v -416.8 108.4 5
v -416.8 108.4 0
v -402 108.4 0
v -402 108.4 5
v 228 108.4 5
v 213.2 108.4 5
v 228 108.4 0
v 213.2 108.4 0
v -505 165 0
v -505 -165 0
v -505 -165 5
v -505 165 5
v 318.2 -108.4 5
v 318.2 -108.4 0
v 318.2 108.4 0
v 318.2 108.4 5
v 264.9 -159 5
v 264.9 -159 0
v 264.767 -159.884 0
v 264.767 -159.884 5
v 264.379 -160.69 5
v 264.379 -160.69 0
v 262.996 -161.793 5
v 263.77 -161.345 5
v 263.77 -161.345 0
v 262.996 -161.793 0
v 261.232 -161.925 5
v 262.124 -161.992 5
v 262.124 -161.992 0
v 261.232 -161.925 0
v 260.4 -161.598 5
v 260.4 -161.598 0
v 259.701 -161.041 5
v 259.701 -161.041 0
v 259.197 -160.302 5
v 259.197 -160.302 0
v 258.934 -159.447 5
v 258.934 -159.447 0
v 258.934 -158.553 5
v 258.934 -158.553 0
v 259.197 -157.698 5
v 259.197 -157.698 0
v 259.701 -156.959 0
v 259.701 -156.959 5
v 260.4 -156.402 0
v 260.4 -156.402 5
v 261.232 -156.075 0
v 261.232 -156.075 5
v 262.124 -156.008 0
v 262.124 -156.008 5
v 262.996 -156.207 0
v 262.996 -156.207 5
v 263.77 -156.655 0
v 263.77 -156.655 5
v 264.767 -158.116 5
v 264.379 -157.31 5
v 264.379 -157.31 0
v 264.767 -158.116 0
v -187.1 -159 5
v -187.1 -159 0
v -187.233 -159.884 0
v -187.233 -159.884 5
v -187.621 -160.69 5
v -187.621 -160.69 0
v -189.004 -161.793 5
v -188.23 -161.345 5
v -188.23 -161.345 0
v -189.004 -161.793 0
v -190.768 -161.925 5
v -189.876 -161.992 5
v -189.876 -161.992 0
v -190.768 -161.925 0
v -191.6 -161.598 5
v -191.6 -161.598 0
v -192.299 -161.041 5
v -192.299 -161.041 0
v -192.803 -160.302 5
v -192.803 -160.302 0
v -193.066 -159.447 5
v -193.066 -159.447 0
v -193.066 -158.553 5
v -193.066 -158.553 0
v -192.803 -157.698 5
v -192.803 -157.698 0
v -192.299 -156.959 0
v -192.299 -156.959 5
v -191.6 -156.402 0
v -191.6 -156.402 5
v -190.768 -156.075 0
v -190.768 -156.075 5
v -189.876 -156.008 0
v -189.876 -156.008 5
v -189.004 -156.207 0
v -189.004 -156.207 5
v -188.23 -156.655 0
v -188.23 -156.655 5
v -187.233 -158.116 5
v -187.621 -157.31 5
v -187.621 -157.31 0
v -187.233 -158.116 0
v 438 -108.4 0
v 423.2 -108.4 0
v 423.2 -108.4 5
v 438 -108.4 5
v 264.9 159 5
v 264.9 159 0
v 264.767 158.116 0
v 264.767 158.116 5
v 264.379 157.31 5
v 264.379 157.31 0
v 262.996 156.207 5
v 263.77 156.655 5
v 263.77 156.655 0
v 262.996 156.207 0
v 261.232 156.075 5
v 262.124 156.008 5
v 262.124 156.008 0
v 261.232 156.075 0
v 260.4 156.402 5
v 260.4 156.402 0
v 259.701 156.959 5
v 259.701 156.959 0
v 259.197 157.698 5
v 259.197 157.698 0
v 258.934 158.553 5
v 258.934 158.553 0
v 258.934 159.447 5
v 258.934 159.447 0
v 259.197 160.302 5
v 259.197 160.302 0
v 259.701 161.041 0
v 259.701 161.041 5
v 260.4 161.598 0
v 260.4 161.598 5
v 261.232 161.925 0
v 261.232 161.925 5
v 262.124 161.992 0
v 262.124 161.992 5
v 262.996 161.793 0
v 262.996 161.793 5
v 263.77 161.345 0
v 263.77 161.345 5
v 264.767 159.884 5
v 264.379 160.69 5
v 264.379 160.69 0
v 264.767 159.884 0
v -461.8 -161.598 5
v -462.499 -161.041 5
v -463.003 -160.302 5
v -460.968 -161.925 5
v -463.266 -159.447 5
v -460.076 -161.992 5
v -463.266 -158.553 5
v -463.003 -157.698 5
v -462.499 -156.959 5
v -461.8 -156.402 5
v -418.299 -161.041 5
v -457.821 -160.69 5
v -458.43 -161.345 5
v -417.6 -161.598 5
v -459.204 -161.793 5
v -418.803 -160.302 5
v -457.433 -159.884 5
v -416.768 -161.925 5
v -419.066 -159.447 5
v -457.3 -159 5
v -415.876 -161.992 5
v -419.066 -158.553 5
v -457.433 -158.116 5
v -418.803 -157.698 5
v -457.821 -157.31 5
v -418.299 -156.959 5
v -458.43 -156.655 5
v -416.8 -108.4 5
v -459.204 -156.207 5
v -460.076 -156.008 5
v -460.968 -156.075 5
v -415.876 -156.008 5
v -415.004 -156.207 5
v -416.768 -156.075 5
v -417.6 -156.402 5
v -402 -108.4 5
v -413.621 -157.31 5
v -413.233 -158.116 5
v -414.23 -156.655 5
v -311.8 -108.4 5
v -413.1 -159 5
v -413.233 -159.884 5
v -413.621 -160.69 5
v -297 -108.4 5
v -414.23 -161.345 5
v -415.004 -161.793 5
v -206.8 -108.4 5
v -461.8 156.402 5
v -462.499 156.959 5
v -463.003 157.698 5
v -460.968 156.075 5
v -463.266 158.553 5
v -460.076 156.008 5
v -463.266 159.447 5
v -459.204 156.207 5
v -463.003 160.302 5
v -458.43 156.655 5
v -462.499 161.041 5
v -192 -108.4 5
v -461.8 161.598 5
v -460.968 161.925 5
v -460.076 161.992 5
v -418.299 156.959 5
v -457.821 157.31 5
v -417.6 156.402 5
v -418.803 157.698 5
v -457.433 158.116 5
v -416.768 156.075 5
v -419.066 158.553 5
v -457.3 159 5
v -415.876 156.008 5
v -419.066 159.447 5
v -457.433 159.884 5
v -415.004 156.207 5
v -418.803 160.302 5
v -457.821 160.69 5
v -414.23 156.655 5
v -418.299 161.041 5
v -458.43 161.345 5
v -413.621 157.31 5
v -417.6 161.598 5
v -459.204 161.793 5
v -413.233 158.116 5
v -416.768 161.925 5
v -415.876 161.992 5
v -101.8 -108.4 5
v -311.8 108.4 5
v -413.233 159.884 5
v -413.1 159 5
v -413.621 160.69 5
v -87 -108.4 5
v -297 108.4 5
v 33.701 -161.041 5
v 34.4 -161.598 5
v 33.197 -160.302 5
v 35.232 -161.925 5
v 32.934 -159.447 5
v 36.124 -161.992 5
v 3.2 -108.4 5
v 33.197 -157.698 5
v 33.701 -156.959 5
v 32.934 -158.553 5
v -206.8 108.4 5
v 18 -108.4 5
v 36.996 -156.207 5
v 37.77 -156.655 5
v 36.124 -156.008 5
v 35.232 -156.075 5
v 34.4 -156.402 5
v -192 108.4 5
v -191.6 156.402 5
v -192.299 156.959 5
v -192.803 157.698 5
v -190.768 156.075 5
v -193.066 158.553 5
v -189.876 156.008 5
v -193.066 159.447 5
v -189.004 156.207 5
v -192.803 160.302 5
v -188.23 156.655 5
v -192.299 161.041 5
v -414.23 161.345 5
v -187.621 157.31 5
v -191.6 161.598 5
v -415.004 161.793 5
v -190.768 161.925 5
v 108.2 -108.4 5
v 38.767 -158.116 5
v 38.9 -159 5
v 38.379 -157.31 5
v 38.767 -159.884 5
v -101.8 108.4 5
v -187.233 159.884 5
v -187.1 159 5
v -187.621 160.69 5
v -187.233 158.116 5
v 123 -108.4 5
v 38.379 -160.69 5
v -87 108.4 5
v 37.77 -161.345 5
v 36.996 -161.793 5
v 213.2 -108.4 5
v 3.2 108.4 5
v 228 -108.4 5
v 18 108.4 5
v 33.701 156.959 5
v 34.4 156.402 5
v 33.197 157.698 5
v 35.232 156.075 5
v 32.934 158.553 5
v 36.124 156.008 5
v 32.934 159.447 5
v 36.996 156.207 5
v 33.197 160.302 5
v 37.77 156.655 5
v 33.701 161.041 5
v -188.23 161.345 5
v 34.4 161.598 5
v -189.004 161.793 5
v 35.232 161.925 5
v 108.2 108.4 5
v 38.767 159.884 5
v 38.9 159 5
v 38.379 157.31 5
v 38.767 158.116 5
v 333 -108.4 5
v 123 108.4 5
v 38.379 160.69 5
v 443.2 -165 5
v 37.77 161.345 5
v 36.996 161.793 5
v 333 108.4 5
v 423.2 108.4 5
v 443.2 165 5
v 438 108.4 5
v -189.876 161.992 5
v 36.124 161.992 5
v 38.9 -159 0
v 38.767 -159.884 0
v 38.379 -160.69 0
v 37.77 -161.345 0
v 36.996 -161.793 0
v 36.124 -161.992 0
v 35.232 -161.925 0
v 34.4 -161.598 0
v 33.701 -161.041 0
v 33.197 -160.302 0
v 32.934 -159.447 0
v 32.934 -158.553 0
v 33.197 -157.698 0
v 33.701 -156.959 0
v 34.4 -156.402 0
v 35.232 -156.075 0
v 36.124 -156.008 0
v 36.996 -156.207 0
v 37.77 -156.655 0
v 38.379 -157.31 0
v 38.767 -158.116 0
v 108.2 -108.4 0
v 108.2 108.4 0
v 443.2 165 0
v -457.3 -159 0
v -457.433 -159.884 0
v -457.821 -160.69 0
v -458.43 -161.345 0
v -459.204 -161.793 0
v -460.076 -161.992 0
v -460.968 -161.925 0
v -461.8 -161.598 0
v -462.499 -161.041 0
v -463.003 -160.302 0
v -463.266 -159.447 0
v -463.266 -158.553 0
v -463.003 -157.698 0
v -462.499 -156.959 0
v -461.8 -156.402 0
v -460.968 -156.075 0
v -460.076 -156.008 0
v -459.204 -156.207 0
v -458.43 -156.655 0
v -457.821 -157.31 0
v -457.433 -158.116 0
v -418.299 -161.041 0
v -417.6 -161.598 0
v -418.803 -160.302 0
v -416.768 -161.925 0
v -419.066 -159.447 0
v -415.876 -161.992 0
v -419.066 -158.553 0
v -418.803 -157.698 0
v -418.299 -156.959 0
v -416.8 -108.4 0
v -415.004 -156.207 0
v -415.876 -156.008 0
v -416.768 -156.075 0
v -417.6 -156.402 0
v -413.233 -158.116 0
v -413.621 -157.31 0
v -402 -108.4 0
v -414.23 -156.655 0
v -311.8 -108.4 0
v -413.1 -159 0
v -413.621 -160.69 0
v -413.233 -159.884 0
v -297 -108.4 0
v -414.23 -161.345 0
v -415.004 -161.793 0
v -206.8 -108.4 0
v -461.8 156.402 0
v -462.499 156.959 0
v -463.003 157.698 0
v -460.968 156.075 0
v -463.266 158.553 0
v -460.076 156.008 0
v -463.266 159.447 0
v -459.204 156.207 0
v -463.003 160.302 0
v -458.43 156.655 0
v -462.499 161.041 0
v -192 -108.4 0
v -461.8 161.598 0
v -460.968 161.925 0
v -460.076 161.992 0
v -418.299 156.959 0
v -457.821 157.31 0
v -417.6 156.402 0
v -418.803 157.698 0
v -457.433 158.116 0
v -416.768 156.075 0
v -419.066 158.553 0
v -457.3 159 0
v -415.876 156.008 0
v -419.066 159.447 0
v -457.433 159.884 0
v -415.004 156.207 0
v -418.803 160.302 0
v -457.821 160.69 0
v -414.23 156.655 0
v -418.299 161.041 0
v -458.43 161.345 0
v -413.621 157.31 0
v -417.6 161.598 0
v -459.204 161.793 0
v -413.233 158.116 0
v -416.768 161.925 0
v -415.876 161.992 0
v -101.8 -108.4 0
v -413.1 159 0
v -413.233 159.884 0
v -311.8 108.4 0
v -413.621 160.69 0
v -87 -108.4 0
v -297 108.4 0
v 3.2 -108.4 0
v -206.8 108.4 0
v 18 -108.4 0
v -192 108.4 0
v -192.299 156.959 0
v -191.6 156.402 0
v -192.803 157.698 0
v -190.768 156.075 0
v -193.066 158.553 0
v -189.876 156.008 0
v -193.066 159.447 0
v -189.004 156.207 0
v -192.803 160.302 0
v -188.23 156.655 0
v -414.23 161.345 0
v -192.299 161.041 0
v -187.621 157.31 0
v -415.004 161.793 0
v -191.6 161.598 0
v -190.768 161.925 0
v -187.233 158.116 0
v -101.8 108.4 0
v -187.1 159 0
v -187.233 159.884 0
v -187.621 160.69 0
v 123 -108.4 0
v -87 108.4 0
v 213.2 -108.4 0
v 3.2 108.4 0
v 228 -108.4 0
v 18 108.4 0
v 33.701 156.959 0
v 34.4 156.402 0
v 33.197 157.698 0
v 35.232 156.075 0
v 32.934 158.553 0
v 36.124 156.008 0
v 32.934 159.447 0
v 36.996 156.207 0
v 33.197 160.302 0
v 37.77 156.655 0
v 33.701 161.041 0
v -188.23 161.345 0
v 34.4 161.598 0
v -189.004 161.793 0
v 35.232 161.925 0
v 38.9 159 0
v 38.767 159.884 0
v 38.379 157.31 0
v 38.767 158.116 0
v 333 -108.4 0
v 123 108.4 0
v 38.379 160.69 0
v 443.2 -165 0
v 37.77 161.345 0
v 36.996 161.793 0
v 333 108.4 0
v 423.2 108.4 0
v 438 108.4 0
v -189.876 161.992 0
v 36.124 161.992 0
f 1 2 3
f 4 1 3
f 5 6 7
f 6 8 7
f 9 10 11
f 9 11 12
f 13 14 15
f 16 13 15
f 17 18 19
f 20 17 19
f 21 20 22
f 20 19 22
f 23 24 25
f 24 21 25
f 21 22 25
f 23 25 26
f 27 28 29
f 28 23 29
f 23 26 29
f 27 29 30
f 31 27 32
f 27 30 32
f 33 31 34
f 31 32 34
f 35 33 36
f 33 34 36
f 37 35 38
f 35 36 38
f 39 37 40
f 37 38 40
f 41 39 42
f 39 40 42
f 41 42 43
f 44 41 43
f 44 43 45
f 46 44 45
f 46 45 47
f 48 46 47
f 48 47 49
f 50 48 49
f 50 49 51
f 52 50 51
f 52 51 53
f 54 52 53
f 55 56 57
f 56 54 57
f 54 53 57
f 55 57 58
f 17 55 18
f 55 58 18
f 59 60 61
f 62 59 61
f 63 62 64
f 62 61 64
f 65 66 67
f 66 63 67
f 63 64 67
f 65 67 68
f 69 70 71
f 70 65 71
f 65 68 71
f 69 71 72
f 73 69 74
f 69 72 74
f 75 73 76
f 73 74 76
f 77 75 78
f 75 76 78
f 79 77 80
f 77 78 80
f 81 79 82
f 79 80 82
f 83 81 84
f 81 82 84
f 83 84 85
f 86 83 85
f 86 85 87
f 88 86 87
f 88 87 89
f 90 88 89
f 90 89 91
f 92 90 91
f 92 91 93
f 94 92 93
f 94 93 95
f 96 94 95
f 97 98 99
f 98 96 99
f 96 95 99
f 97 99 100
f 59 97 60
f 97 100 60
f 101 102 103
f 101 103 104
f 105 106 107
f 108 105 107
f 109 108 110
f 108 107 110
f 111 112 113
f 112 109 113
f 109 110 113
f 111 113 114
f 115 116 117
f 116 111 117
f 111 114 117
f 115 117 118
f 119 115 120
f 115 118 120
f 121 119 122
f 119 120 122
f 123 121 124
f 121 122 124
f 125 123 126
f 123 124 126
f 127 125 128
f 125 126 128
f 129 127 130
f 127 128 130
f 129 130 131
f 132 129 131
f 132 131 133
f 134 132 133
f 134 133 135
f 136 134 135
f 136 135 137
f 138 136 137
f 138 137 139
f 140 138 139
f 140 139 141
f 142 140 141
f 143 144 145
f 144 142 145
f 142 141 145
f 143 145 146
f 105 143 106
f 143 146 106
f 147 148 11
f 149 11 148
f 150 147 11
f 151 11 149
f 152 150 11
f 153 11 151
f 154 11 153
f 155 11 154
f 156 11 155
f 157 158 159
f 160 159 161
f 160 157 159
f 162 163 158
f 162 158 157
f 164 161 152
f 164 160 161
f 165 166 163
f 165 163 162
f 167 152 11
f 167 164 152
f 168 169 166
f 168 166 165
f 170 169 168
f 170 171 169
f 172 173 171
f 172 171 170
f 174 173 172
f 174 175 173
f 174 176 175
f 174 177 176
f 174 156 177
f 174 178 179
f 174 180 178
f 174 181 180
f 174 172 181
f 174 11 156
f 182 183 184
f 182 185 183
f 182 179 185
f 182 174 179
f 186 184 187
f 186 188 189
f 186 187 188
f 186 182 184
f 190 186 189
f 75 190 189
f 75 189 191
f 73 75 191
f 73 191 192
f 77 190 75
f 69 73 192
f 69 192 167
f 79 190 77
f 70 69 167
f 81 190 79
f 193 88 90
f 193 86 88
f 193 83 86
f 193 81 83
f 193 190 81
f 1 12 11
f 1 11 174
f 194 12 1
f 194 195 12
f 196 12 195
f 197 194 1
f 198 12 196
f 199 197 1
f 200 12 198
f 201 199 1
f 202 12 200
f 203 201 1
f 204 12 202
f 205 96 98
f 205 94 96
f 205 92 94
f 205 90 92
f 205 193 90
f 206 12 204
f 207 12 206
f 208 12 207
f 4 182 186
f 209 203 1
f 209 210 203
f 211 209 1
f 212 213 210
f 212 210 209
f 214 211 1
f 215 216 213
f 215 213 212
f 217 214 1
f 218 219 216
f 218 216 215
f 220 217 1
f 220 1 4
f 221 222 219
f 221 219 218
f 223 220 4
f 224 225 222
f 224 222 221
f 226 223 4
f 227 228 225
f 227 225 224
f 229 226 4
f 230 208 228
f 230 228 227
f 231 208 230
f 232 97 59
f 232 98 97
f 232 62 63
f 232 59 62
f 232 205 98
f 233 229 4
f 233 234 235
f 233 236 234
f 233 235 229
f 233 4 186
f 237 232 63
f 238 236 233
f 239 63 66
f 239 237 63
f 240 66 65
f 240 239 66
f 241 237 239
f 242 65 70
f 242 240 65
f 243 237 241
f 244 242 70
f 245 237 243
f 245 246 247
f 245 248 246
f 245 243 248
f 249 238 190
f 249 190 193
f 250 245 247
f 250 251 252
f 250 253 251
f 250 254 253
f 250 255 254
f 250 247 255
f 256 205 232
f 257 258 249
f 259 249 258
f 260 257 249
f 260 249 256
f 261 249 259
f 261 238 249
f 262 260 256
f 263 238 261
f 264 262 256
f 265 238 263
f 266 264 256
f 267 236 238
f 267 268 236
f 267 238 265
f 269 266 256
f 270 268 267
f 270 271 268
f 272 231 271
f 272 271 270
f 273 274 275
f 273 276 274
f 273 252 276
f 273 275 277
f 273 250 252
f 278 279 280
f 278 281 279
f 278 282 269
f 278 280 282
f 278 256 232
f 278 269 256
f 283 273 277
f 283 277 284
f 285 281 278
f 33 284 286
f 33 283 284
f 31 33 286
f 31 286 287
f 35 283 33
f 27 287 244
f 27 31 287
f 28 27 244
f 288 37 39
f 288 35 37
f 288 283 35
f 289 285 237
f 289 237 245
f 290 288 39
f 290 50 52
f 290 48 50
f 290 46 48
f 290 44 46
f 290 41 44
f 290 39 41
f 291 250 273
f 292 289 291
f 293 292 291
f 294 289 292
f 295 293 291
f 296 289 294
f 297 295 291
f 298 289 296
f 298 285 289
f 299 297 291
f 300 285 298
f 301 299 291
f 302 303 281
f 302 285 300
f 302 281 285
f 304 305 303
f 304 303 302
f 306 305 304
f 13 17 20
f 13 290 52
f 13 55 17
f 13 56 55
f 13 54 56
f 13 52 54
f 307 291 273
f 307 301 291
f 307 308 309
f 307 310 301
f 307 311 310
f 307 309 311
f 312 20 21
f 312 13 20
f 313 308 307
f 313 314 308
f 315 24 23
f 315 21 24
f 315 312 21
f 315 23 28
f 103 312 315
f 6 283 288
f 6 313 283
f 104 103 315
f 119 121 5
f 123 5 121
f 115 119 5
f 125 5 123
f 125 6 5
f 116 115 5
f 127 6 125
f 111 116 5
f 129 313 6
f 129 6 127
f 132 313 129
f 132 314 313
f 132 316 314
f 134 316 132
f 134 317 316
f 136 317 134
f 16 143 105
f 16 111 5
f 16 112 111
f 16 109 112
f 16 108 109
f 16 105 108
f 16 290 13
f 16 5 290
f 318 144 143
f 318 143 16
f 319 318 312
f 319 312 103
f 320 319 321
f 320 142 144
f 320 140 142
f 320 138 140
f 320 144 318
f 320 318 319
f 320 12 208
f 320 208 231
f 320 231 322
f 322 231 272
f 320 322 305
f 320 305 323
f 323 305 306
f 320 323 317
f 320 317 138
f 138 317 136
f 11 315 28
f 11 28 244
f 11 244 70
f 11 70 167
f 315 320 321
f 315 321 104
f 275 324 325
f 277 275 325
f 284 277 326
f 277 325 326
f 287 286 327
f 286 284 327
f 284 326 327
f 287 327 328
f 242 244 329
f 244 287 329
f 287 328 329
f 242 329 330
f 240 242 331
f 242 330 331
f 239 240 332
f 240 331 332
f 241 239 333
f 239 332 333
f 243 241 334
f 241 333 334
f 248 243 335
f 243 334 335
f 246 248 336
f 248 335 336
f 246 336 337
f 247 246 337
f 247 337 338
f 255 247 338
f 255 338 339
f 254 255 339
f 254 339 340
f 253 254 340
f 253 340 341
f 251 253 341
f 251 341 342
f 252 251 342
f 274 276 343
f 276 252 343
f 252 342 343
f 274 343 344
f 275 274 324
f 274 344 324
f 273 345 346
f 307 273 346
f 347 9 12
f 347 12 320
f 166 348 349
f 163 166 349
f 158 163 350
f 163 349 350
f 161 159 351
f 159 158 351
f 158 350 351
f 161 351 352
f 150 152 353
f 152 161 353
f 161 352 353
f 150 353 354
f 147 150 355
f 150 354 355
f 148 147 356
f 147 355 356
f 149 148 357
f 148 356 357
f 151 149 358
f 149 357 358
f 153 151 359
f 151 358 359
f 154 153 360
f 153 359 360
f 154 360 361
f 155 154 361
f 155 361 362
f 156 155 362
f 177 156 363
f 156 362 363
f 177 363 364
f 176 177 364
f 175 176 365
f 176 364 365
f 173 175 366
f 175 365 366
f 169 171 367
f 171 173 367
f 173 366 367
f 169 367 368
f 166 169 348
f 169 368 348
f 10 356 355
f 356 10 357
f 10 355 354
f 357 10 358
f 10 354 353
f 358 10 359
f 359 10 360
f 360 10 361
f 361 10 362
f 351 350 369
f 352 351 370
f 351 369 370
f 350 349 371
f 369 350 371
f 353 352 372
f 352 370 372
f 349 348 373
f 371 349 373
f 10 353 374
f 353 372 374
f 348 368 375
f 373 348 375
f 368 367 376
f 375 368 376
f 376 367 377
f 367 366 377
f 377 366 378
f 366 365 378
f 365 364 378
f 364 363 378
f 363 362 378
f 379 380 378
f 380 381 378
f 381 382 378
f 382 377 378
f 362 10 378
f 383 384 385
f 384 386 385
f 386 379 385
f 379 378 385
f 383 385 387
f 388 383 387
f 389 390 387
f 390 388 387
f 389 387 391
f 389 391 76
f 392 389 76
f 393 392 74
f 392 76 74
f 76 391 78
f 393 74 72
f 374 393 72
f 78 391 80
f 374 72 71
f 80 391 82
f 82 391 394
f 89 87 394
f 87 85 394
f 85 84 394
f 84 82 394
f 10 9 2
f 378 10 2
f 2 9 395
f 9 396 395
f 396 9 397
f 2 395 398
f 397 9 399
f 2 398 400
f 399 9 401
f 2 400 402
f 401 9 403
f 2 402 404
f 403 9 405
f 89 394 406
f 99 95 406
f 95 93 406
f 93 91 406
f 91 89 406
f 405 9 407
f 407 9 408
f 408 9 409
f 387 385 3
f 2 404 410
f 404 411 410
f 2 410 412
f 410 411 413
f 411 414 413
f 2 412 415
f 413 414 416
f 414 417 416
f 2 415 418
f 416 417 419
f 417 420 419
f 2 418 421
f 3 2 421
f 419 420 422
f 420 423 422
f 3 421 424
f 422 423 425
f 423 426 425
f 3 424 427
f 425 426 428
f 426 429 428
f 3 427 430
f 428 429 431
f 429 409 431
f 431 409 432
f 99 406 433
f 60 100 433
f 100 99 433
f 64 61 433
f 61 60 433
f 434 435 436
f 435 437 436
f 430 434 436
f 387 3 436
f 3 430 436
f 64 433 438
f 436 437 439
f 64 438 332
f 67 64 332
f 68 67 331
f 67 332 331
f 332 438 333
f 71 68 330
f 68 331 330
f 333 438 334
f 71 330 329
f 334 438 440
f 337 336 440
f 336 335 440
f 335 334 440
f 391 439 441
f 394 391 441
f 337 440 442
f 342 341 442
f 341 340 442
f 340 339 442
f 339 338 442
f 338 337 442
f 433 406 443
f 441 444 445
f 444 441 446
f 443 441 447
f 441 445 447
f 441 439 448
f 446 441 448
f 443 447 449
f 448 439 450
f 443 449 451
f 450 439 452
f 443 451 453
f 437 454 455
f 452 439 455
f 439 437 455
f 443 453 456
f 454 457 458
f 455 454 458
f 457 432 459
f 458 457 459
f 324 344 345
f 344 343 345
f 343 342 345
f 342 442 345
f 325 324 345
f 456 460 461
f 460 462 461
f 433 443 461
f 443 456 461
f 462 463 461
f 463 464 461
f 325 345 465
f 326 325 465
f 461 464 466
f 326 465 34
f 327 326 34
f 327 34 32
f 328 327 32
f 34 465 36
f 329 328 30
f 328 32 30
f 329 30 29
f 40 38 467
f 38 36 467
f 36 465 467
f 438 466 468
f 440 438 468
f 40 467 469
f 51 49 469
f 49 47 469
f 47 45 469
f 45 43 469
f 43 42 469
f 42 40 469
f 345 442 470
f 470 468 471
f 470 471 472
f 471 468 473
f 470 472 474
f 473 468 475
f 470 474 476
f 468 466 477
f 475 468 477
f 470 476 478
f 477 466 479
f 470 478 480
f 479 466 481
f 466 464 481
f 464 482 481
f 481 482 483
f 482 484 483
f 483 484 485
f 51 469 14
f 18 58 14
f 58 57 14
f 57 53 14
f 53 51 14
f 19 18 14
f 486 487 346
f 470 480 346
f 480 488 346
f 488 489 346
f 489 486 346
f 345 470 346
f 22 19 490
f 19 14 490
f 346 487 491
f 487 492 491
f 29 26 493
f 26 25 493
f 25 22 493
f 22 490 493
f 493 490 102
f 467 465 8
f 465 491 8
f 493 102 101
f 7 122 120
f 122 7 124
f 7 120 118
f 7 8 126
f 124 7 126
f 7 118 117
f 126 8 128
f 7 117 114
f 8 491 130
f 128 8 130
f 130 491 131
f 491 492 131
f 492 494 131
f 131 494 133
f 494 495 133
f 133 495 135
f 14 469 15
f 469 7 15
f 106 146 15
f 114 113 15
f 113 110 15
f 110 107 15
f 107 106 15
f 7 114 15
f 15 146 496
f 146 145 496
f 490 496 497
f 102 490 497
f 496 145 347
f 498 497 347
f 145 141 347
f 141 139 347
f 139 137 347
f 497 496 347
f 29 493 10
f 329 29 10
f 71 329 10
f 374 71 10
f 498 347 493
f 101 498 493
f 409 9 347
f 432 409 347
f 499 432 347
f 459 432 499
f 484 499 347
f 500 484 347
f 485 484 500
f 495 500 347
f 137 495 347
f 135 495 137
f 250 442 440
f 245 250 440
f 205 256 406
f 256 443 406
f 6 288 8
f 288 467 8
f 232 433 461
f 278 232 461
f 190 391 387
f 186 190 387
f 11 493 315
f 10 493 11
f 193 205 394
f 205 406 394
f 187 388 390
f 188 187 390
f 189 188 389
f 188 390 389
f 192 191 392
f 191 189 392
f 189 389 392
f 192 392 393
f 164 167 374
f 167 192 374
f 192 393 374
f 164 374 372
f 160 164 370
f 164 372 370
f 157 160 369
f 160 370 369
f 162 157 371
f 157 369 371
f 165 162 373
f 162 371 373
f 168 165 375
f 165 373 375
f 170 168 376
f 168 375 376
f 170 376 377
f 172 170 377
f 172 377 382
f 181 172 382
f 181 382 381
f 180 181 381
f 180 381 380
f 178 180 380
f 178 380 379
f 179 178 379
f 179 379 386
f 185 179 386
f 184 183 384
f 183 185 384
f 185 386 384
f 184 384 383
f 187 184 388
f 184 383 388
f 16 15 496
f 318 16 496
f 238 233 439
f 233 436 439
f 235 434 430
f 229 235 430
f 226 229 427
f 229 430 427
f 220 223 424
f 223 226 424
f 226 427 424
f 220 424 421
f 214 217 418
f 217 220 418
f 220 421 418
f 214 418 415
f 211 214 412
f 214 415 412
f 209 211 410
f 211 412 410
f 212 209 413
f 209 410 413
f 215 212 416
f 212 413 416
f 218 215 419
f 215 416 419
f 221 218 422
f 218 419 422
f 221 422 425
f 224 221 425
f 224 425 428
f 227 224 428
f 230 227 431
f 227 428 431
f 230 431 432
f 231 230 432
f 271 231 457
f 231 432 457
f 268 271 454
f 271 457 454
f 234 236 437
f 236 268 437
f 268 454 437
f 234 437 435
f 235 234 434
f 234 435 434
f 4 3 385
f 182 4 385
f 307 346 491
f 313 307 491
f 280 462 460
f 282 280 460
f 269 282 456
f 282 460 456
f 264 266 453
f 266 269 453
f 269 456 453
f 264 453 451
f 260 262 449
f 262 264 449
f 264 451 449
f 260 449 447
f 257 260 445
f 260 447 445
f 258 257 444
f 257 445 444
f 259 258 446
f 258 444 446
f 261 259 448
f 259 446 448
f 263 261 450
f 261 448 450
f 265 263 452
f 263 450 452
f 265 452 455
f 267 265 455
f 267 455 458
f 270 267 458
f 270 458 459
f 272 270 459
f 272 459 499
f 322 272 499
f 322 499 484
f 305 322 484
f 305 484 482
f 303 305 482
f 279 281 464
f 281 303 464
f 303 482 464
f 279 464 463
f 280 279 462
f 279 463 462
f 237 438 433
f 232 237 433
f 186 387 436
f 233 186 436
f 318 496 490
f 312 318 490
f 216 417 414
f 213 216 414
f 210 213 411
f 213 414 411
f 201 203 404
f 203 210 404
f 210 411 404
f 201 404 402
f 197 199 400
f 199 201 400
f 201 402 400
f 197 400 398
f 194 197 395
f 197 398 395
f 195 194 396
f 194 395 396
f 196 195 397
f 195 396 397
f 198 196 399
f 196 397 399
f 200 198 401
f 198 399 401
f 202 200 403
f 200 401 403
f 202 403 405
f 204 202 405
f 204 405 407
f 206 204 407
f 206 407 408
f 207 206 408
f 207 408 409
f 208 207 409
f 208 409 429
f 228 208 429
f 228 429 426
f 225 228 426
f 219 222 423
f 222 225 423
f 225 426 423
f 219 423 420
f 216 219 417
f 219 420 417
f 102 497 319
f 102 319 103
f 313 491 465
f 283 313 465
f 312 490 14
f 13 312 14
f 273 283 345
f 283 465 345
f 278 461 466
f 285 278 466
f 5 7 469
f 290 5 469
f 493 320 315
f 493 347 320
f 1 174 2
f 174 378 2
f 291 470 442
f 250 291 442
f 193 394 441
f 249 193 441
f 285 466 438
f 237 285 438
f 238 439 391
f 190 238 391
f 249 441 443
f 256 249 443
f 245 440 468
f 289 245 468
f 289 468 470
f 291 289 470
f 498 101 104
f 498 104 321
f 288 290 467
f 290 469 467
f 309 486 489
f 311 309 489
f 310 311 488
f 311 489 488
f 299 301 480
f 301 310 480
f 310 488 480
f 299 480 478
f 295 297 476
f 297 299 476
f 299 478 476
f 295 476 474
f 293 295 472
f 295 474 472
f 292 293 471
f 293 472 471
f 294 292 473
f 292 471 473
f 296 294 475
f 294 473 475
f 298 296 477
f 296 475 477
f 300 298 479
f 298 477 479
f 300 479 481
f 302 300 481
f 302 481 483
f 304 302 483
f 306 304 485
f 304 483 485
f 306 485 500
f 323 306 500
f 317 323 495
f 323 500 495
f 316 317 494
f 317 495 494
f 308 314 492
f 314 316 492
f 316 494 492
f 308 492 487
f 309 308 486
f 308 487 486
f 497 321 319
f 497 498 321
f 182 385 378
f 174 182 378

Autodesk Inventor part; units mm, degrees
ref_plane "YZ Plane" through (0, 0, 0) normal (1, 0, 0) x (0, 1, 0)
ref_plane "XZ Plane" through (0, 0, 0) normal (0, 1, 0) x (-1, 0, 0)
ref_plane "XY Plane" through (0, 0, 0) normal (0, 0, 1) x (1, 0, 0)
sketch "Sketch1" plane through (0, 0, 0) normal (0, 0, 1) x (1, 0, 0)
  line L0 (-505, 165) -> (443.2, 165)
  line L1 (443.2, 165) -> (443.2, -165)
  line L2 (443.2, -165) -> (-505, -165)
  line L3 (-505, -165) -> (-505, 165)
  line L4 (0, 231) -> (0, -231) projected
  line L5 (-694.64, 0) -> (632.84, 0) projected
  line L6 (3.2, 108.4) -> (18, 108.4)
  line L7 (18, 108.4) -> (18, -108.4)
  line L8 (18, -108.4) -> (3.2, -108.4)
  line L9 (3.2, -108.4) -> (3.2, 108.4)
  line L10 (-101.8, 108.4) -> (-87, 108.4)
  line L11 (-87, 108.4) -> (-87, -108.4)
  line L12 (-87, -108.4) -> (-101.8, -108.4)
  line L13 (-101.8, -108.4) -> (-101.8, 108.4)
  line L14 (-206.8, 108.4) -> (-192, 108.4)
  line L15 (-192, 108.4) -> (-192, -108.4)
  line L16 (-192, -108.4) -> (-206.8, -108.4)
  line L17 (-206.8, -108.4) -> (-206.8, 108.4)
  line L18 (-311.8, 108.4) -> (-297, 108.4)
  line L19 (-297, 108.4) -> (-297, -108.4)
  line L20 (-297, -108.4) -> (-311.8, -108.4)
  line L21 (-311.8, -108.4) -> (-311.8, 108.4)
  line L22 (-416.8, 108.4) -> (-402, 108.4)
  line L23 (-402, 108.4) -> (-402, -108.4)
  line L24 (-402, -108.4) -> (-416.8, -108.4)
  line L25 (-416.8, -108.4) -> (-416.8, 108.4)
  line L26 (108.2, 108.4) -> (123, 108.4)
  line L27 (123, 108.4) -> (123, -108.4)
  line L28 (123, -108.4) -> (108.2, -108.4)
  line L29 (108.2, -108.4) -> (108.2, 108.4)
  line L30 (213.2, 108.4) -> (228, 108.4)
  line L31 (228, 108.4) -> (228, -108.4)
  line L32 (228, -108.4) -> (213.2, -108.4)
  line L33 (213.2, -108.4) -> (213.2, 108.4)
  line L34 (318.2, 108.4) -> (333, 108.4)
  line L35 (333, 108.4) -> (333, -108.4)
  line L36 (333, -108.4) -> (318.2, -108.4)
  line L37 (318.2, -108.4) -> (318.2, 108.4)
  line L38 (438, 108.4) -> (423.2, 108.4)
  line L39 (423.2, 108.4) -> (423.2, -108.4)
  line L40 (423.2, -108.4) -> (438, -108.4)
  line L41 (438, -108.4) -> (438, 108.4)
  line L42 (-505, 159) -> (443.2, 159) construction
  line L43 (-505, -159) -> (443.2, -159) construction
  circle A0 centre (-416.1, 159) radius 3
  circle A1 centre (-190.1, 159) radius 3
  circle A2 centre (35.9, 159) radius 3
  circle A3 centre (261.9, 159) radius 3
  circle A4 centre (-460.3, 159) radius 3
  circle A5 centre (-416.1, -159) radius 3
  circle A6 centre (-190.1, -159) radius 3
  circle A7 centre (261.9, -159) radius 3
  circle A8 centre (-460.3, -159) radius 3
  circle A9 centre (35.9, -159) radius 3
  point P0 (0, 0)
  dimension "d1" = 330
  dimension "d2" = 216.8
  dimension "d3" = 14.8
  dimension "d5" = 14.8
  dimension "d8" = 14.8
  dimension "d9" = 14.8
  dimension "d11" = 14.8
  dimension "d14" = 14.8
  dimension "d16" = 14.8
  dimension "d18" = 14.8
  dimension "d20" = 438
  dimension "d21" = 14.8
  dimension "d24" = 105
  dimension "d25" = 105
  dimension "d26" = 105
  dimension "d27" = 105
  dimension "d28" = 105
  dimension "d29" = 105
  dimension "d30" = 105
  dimension "d31" = 105
  dimension "d32" = 505
  dimension "d33" = 5.2
  dimension "d34" = 6
  dimension "d35" = 6
  dimension "d36" = 6
  dimension "d37" = 88.9
  dimension "d38" = 88.9
  dimension "d39" = 226
  dimension "d40" = 226
  dimension "d41" = 226
  dimension "d42" = 226
  dimension "d43" = 226
  dimension "d44" = 226
  dimension "d45" = 44.7
  dimension "d46" = 44.7
extrude "Extrusion1" add sketch "Sketch1" along normal blind 5 contours L0 L4 L5 L11 L10 L13 L15 L14 L17 L19 L18 L21 L23 L22 L25 L3 | L0 L1 L5 L41 L38 L39 L35 L34 L37 L31 L30 L33 L27 L26 L29 L7 L6 L9 L4 | L5 L25 L24 L23 L21 L20 L19 L17 L16 L15 L13 L12 L11 L4 L2 L3 | L5 L9 L8 L7 L29 L28 L27 L33 L32 L31 L37 L36 L35 L39 L40 L41 L1 L2 L4
properties part number "FerriteLayer"
